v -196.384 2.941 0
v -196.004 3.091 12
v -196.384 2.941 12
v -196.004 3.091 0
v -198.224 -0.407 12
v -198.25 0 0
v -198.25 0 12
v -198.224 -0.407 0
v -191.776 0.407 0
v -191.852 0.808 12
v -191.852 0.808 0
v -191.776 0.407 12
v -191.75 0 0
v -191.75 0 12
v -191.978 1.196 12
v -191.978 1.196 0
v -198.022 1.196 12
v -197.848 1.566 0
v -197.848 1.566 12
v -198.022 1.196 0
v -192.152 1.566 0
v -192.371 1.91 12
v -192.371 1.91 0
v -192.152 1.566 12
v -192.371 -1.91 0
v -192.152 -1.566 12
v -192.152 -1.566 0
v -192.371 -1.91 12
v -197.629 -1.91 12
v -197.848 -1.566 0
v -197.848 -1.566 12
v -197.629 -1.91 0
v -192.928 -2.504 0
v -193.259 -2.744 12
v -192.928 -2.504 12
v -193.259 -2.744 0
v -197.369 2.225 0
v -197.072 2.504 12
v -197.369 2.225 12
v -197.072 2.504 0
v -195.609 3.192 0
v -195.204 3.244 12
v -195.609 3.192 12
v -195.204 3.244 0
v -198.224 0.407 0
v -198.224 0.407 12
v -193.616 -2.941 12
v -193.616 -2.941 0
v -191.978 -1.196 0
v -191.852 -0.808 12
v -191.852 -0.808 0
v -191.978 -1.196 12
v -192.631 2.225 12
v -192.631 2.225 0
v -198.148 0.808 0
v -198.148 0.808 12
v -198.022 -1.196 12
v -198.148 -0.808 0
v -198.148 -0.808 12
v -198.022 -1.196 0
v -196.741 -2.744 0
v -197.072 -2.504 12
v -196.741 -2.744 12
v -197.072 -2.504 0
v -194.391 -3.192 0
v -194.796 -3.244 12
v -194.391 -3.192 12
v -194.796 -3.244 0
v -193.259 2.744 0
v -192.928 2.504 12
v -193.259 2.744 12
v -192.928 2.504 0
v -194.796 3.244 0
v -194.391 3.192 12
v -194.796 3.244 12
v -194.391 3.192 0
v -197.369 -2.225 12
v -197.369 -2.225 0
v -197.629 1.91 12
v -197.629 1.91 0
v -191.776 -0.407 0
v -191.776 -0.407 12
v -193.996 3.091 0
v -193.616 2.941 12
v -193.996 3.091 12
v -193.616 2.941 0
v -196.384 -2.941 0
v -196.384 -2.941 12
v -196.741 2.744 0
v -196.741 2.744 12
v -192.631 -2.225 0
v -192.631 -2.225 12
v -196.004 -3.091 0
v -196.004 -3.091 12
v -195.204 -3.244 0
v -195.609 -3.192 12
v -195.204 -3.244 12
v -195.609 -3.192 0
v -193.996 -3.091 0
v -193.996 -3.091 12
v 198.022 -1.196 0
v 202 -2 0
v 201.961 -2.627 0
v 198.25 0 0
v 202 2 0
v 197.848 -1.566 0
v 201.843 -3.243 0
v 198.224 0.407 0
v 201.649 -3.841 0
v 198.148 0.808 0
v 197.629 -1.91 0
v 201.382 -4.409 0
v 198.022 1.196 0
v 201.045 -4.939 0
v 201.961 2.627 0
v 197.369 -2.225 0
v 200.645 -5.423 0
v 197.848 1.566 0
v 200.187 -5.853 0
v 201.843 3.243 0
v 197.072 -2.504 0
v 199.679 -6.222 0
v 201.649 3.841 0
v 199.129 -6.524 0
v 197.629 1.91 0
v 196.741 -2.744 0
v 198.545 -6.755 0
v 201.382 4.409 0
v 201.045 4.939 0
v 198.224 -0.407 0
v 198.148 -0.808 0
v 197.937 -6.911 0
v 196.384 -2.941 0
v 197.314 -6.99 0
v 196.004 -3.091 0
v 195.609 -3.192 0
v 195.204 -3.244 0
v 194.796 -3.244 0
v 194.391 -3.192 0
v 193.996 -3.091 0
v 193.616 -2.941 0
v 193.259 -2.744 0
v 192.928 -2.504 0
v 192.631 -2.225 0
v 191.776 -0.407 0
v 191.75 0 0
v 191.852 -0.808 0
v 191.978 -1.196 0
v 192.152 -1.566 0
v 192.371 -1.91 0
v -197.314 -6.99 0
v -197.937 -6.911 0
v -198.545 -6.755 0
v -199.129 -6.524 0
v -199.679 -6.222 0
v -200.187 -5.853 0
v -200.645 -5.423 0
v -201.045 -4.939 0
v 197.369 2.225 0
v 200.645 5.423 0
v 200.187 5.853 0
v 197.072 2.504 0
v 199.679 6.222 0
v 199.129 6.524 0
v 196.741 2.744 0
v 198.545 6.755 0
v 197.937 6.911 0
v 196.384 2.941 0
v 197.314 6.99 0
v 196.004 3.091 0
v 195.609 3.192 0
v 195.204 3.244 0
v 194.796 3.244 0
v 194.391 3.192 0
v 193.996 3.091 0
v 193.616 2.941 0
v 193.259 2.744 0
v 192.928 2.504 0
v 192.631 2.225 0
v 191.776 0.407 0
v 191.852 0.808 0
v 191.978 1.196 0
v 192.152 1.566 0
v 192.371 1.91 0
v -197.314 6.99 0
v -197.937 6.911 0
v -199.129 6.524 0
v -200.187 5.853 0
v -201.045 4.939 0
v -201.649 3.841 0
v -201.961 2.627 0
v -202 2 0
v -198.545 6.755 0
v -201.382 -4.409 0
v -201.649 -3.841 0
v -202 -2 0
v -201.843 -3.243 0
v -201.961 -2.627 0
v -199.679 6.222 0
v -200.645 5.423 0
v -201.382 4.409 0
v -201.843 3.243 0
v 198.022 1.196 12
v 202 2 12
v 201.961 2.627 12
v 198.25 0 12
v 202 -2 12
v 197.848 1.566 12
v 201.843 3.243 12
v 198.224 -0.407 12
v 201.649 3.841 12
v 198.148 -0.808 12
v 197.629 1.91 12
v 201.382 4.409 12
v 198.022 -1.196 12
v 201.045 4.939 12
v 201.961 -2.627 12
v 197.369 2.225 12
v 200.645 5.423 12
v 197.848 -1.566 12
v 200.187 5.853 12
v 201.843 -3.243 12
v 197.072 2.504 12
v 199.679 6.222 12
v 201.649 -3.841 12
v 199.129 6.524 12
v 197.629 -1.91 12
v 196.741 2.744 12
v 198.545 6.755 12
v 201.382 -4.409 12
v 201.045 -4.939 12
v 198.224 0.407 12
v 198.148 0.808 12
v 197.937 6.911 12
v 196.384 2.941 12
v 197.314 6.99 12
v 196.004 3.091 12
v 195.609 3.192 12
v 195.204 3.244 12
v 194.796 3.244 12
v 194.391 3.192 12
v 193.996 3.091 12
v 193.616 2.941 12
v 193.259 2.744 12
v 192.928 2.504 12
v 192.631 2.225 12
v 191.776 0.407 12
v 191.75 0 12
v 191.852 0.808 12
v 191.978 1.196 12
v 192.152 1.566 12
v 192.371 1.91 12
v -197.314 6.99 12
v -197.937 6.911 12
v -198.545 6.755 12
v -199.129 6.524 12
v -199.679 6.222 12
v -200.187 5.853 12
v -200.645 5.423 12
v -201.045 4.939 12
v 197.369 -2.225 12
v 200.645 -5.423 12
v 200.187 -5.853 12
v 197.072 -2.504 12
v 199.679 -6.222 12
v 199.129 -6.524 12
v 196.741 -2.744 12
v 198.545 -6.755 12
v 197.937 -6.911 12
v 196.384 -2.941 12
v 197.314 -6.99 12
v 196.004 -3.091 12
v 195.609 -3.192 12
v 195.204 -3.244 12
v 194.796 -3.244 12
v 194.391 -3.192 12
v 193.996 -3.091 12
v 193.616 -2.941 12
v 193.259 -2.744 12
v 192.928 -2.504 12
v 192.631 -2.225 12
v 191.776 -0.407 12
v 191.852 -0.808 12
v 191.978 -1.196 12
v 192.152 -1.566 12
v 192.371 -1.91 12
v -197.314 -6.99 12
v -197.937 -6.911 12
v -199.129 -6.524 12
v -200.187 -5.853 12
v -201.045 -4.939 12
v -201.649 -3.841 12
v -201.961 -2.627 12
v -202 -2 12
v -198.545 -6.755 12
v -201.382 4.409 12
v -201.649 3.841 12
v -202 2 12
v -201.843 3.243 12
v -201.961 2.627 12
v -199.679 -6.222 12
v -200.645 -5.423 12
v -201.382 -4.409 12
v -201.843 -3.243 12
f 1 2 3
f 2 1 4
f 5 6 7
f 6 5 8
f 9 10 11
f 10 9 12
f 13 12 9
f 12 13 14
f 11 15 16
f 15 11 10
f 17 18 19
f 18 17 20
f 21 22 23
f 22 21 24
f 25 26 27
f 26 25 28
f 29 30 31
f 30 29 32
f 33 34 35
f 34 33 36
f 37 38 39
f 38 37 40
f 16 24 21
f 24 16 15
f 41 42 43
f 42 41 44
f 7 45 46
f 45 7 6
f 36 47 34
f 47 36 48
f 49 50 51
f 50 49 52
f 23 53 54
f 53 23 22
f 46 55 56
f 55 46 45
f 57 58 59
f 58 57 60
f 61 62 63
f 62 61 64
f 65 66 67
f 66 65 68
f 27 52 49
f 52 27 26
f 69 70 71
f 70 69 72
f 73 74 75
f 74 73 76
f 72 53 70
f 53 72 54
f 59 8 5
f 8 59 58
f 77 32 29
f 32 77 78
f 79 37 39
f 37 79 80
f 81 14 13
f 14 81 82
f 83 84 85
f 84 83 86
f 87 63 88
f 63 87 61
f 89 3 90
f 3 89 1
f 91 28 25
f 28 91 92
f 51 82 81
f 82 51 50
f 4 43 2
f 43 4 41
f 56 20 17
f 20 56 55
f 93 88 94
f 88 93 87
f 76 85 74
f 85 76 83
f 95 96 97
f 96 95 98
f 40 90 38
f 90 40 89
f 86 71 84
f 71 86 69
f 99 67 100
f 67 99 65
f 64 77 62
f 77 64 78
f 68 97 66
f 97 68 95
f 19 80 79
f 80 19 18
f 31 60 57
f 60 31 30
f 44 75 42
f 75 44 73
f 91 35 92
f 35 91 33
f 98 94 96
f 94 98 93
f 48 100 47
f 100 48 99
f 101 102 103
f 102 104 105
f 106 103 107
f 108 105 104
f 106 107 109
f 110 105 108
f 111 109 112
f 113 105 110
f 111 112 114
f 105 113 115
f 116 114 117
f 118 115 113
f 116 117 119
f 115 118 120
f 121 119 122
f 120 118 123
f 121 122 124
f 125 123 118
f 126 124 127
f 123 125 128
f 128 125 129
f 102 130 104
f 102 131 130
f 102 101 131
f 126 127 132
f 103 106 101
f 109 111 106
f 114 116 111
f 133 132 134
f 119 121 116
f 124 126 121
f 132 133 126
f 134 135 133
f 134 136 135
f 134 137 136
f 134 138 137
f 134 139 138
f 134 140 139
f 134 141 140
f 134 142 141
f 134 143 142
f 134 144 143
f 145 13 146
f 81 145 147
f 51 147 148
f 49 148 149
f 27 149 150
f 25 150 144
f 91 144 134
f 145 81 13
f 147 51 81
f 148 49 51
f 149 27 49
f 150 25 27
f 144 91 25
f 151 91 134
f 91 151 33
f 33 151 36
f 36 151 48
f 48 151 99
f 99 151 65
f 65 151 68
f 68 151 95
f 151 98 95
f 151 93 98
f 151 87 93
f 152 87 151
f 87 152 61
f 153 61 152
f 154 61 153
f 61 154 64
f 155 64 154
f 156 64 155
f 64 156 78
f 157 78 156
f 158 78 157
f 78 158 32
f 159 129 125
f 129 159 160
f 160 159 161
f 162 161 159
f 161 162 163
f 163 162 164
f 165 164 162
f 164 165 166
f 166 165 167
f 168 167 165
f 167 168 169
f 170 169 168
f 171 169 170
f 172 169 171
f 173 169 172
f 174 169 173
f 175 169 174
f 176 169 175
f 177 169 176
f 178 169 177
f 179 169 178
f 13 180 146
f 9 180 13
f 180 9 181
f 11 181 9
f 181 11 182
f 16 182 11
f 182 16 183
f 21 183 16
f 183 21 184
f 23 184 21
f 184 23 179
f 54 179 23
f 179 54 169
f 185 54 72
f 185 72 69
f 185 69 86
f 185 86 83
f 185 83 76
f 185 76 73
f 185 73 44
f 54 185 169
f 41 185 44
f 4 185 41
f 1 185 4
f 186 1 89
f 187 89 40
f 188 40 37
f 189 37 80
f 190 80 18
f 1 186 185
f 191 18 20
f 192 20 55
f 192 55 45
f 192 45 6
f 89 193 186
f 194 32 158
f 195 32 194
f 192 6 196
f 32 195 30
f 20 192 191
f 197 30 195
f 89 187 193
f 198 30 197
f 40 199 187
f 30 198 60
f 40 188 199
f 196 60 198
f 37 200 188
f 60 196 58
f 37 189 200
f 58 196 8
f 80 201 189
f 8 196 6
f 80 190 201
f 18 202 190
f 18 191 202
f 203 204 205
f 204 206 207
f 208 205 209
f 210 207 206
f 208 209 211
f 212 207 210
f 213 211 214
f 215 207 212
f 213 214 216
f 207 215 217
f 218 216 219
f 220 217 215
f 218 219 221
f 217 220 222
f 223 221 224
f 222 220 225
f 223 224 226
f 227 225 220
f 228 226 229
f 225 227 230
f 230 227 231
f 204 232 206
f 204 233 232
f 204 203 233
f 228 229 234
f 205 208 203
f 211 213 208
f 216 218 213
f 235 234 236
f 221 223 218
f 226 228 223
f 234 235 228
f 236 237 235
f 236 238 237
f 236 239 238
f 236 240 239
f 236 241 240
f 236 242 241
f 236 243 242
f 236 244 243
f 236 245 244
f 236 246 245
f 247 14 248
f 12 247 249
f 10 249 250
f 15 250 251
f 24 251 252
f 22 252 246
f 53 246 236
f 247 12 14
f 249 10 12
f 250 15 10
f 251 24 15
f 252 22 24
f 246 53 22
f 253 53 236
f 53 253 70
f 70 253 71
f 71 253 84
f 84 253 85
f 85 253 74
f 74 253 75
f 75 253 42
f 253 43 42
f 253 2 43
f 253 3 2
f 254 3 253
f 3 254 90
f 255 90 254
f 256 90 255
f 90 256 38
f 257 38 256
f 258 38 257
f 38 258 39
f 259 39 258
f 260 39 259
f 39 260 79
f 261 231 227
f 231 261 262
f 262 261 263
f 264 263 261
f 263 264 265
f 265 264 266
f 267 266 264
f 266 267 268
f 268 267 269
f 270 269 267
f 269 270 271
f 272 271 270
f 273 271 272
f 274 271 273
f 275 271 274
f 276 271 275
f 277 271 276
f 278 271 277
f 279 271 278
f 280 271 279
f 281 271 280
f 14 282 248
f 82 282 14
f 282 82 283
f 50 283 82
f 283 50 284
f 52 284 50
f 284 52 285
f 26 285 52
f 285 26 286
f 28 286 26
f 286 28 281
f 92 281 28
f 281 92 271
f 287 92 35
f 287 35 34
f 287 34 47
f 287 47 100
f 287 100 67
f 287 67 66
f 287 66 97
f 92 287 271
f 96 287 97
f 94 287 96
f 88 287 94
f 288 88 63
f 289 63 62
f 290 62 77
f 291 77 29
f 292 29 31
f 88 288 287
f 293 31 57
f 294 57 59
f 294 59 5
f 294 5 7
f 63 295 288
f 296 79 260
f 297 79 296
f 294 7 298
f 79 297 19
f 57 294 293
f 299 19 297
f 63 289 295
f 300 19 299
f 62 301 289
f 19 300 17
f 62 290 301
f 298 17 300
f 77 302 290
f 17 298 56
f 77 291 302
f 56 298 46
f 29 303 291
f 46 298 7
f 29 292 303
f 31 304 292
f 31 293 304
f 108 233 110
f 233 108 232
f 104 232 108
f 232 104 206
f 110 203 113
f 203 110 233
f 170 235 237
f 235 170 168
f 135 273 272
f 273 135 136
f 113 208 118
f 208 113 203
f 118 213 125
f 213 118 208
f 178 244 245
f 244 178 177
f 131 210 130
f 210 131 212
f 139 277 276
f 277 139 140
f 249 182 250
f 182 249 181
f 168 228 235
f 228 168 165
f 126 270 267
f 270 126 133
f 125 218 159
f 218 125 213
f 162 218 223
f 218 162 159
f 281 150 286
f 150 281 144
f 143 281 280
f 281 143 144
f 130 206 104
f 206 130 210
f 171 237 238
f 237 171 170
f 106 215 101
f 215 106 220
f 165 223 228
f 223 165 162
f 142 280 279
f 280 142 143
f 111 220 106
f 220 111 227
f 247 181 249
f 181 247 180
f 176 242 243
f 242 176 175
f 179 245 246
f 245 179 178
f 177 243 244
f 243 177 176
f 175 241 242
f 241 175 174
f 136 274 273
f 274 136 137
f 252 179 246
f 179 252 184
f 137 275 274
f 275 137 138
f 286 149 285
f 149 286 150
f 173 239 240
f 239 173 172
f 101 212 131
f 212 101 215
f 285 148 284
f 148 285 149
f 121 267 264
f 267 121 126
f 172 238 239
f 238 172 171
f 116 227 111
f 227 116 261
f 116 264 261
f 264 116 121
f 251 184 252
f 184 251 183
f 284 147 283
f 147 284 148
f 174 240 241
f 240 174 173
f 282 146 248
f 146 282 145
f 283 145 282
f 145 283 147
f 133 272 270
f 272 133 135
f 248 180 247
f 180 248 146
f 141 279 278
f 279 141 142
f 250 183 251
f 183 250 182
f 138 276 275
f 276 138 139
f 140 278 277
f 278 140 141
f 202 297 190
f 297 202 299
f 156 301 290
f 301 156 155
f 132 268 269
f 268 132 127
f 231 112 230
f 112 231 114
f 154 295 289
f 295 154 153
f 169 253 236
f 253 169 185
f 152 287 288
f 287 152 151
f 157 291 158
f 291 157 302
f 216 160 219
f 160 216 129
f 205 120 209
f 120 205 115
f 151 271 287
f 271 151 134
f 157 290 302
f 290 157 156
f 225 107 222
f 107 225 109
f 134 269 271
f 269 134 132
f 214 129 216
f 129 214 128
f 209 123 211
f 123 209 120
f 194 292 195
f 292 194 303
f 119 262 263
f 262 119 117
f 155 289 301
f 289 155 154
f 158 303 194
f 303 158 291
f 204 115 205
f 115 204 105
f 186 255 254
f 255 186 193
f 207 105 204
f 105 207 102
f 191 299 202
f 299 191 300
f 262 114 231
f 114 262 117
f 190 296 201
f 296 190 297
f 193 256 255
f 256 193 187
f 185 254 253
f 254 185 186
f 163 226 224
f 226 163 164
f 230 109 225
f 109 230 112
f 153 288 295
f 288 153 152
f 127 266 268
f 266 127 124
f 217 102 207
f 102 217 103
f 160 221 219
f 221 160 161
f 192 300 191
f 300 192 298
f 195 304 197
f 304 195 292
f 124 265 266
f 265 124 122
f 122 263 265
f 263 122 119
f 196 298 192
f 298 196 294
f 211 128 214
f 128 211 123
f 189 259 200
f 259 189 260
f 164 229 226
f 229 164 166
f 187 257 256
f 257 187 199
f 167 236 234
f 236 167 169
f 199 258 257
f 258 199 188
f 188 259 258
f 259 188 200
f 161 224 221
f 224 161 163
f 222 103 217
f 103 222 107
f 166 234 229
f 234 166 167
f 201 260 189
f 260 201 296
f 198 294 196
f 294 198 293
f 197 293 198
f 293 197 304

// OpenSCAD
$fn = 50;


difference() {
	union() {
		hull() {
			translate(v = [-197.0000000000, 2.0000000000, 0]) {
				cylinder(h = 12, r = 5);
			}
			translate(v = [197.0000000000, 2.0000000000, 0]) {
				cylinder(h = 12, r = 5);
			}
			translate(v = [-197.0000000000, -2.0000000000, 0]) {
				cylinder(h = 12, r = 5);
			}
			translate(v = [197.0000000000, -2.0000000000, 0]) {
				cylinder(h = 12, r = 5);
			}
		}
	}
	union() {
		translate(v = [-195.0000000000, 0.0000000000, 0]) {
			cylinder(h = 12, r = 3.2500000000);
		}
		translate(v = [195.0000000000, 0.0000000000, 0]) {
			cylinder(h = 12, r = 3.2500000000);
		}
		translate(v = [-195.0000000000, 0.0000000000, 0]) {
			cylinder(h = 12, r = 1.8000000000);
		}
		translate(v = [195.0000000000, 0.0000000000, 0]) {
			cylinder(h = 12, r = 1.8000000000);
		}
		translate(v = [-195.0000000000, 0.0000000000, 0]) {
			cylinder(h = 12, r = 1.8000000000);
		}
		translate(v = [195.0000000000, 0.0000000000, 0]) {
			cylinder(h = 12, r = 1.8000000000);
		}
		translate(v = [-195.0000000000, 0.0000000000, 0]) {
			cylinder(h = 12, r = 1.8000000000);
		}
		translate(v = [195.0000000000, 0.0000000000, 0]) {
			cylinder(h = 12, r = 1.8000000000);
		}
	}
}
